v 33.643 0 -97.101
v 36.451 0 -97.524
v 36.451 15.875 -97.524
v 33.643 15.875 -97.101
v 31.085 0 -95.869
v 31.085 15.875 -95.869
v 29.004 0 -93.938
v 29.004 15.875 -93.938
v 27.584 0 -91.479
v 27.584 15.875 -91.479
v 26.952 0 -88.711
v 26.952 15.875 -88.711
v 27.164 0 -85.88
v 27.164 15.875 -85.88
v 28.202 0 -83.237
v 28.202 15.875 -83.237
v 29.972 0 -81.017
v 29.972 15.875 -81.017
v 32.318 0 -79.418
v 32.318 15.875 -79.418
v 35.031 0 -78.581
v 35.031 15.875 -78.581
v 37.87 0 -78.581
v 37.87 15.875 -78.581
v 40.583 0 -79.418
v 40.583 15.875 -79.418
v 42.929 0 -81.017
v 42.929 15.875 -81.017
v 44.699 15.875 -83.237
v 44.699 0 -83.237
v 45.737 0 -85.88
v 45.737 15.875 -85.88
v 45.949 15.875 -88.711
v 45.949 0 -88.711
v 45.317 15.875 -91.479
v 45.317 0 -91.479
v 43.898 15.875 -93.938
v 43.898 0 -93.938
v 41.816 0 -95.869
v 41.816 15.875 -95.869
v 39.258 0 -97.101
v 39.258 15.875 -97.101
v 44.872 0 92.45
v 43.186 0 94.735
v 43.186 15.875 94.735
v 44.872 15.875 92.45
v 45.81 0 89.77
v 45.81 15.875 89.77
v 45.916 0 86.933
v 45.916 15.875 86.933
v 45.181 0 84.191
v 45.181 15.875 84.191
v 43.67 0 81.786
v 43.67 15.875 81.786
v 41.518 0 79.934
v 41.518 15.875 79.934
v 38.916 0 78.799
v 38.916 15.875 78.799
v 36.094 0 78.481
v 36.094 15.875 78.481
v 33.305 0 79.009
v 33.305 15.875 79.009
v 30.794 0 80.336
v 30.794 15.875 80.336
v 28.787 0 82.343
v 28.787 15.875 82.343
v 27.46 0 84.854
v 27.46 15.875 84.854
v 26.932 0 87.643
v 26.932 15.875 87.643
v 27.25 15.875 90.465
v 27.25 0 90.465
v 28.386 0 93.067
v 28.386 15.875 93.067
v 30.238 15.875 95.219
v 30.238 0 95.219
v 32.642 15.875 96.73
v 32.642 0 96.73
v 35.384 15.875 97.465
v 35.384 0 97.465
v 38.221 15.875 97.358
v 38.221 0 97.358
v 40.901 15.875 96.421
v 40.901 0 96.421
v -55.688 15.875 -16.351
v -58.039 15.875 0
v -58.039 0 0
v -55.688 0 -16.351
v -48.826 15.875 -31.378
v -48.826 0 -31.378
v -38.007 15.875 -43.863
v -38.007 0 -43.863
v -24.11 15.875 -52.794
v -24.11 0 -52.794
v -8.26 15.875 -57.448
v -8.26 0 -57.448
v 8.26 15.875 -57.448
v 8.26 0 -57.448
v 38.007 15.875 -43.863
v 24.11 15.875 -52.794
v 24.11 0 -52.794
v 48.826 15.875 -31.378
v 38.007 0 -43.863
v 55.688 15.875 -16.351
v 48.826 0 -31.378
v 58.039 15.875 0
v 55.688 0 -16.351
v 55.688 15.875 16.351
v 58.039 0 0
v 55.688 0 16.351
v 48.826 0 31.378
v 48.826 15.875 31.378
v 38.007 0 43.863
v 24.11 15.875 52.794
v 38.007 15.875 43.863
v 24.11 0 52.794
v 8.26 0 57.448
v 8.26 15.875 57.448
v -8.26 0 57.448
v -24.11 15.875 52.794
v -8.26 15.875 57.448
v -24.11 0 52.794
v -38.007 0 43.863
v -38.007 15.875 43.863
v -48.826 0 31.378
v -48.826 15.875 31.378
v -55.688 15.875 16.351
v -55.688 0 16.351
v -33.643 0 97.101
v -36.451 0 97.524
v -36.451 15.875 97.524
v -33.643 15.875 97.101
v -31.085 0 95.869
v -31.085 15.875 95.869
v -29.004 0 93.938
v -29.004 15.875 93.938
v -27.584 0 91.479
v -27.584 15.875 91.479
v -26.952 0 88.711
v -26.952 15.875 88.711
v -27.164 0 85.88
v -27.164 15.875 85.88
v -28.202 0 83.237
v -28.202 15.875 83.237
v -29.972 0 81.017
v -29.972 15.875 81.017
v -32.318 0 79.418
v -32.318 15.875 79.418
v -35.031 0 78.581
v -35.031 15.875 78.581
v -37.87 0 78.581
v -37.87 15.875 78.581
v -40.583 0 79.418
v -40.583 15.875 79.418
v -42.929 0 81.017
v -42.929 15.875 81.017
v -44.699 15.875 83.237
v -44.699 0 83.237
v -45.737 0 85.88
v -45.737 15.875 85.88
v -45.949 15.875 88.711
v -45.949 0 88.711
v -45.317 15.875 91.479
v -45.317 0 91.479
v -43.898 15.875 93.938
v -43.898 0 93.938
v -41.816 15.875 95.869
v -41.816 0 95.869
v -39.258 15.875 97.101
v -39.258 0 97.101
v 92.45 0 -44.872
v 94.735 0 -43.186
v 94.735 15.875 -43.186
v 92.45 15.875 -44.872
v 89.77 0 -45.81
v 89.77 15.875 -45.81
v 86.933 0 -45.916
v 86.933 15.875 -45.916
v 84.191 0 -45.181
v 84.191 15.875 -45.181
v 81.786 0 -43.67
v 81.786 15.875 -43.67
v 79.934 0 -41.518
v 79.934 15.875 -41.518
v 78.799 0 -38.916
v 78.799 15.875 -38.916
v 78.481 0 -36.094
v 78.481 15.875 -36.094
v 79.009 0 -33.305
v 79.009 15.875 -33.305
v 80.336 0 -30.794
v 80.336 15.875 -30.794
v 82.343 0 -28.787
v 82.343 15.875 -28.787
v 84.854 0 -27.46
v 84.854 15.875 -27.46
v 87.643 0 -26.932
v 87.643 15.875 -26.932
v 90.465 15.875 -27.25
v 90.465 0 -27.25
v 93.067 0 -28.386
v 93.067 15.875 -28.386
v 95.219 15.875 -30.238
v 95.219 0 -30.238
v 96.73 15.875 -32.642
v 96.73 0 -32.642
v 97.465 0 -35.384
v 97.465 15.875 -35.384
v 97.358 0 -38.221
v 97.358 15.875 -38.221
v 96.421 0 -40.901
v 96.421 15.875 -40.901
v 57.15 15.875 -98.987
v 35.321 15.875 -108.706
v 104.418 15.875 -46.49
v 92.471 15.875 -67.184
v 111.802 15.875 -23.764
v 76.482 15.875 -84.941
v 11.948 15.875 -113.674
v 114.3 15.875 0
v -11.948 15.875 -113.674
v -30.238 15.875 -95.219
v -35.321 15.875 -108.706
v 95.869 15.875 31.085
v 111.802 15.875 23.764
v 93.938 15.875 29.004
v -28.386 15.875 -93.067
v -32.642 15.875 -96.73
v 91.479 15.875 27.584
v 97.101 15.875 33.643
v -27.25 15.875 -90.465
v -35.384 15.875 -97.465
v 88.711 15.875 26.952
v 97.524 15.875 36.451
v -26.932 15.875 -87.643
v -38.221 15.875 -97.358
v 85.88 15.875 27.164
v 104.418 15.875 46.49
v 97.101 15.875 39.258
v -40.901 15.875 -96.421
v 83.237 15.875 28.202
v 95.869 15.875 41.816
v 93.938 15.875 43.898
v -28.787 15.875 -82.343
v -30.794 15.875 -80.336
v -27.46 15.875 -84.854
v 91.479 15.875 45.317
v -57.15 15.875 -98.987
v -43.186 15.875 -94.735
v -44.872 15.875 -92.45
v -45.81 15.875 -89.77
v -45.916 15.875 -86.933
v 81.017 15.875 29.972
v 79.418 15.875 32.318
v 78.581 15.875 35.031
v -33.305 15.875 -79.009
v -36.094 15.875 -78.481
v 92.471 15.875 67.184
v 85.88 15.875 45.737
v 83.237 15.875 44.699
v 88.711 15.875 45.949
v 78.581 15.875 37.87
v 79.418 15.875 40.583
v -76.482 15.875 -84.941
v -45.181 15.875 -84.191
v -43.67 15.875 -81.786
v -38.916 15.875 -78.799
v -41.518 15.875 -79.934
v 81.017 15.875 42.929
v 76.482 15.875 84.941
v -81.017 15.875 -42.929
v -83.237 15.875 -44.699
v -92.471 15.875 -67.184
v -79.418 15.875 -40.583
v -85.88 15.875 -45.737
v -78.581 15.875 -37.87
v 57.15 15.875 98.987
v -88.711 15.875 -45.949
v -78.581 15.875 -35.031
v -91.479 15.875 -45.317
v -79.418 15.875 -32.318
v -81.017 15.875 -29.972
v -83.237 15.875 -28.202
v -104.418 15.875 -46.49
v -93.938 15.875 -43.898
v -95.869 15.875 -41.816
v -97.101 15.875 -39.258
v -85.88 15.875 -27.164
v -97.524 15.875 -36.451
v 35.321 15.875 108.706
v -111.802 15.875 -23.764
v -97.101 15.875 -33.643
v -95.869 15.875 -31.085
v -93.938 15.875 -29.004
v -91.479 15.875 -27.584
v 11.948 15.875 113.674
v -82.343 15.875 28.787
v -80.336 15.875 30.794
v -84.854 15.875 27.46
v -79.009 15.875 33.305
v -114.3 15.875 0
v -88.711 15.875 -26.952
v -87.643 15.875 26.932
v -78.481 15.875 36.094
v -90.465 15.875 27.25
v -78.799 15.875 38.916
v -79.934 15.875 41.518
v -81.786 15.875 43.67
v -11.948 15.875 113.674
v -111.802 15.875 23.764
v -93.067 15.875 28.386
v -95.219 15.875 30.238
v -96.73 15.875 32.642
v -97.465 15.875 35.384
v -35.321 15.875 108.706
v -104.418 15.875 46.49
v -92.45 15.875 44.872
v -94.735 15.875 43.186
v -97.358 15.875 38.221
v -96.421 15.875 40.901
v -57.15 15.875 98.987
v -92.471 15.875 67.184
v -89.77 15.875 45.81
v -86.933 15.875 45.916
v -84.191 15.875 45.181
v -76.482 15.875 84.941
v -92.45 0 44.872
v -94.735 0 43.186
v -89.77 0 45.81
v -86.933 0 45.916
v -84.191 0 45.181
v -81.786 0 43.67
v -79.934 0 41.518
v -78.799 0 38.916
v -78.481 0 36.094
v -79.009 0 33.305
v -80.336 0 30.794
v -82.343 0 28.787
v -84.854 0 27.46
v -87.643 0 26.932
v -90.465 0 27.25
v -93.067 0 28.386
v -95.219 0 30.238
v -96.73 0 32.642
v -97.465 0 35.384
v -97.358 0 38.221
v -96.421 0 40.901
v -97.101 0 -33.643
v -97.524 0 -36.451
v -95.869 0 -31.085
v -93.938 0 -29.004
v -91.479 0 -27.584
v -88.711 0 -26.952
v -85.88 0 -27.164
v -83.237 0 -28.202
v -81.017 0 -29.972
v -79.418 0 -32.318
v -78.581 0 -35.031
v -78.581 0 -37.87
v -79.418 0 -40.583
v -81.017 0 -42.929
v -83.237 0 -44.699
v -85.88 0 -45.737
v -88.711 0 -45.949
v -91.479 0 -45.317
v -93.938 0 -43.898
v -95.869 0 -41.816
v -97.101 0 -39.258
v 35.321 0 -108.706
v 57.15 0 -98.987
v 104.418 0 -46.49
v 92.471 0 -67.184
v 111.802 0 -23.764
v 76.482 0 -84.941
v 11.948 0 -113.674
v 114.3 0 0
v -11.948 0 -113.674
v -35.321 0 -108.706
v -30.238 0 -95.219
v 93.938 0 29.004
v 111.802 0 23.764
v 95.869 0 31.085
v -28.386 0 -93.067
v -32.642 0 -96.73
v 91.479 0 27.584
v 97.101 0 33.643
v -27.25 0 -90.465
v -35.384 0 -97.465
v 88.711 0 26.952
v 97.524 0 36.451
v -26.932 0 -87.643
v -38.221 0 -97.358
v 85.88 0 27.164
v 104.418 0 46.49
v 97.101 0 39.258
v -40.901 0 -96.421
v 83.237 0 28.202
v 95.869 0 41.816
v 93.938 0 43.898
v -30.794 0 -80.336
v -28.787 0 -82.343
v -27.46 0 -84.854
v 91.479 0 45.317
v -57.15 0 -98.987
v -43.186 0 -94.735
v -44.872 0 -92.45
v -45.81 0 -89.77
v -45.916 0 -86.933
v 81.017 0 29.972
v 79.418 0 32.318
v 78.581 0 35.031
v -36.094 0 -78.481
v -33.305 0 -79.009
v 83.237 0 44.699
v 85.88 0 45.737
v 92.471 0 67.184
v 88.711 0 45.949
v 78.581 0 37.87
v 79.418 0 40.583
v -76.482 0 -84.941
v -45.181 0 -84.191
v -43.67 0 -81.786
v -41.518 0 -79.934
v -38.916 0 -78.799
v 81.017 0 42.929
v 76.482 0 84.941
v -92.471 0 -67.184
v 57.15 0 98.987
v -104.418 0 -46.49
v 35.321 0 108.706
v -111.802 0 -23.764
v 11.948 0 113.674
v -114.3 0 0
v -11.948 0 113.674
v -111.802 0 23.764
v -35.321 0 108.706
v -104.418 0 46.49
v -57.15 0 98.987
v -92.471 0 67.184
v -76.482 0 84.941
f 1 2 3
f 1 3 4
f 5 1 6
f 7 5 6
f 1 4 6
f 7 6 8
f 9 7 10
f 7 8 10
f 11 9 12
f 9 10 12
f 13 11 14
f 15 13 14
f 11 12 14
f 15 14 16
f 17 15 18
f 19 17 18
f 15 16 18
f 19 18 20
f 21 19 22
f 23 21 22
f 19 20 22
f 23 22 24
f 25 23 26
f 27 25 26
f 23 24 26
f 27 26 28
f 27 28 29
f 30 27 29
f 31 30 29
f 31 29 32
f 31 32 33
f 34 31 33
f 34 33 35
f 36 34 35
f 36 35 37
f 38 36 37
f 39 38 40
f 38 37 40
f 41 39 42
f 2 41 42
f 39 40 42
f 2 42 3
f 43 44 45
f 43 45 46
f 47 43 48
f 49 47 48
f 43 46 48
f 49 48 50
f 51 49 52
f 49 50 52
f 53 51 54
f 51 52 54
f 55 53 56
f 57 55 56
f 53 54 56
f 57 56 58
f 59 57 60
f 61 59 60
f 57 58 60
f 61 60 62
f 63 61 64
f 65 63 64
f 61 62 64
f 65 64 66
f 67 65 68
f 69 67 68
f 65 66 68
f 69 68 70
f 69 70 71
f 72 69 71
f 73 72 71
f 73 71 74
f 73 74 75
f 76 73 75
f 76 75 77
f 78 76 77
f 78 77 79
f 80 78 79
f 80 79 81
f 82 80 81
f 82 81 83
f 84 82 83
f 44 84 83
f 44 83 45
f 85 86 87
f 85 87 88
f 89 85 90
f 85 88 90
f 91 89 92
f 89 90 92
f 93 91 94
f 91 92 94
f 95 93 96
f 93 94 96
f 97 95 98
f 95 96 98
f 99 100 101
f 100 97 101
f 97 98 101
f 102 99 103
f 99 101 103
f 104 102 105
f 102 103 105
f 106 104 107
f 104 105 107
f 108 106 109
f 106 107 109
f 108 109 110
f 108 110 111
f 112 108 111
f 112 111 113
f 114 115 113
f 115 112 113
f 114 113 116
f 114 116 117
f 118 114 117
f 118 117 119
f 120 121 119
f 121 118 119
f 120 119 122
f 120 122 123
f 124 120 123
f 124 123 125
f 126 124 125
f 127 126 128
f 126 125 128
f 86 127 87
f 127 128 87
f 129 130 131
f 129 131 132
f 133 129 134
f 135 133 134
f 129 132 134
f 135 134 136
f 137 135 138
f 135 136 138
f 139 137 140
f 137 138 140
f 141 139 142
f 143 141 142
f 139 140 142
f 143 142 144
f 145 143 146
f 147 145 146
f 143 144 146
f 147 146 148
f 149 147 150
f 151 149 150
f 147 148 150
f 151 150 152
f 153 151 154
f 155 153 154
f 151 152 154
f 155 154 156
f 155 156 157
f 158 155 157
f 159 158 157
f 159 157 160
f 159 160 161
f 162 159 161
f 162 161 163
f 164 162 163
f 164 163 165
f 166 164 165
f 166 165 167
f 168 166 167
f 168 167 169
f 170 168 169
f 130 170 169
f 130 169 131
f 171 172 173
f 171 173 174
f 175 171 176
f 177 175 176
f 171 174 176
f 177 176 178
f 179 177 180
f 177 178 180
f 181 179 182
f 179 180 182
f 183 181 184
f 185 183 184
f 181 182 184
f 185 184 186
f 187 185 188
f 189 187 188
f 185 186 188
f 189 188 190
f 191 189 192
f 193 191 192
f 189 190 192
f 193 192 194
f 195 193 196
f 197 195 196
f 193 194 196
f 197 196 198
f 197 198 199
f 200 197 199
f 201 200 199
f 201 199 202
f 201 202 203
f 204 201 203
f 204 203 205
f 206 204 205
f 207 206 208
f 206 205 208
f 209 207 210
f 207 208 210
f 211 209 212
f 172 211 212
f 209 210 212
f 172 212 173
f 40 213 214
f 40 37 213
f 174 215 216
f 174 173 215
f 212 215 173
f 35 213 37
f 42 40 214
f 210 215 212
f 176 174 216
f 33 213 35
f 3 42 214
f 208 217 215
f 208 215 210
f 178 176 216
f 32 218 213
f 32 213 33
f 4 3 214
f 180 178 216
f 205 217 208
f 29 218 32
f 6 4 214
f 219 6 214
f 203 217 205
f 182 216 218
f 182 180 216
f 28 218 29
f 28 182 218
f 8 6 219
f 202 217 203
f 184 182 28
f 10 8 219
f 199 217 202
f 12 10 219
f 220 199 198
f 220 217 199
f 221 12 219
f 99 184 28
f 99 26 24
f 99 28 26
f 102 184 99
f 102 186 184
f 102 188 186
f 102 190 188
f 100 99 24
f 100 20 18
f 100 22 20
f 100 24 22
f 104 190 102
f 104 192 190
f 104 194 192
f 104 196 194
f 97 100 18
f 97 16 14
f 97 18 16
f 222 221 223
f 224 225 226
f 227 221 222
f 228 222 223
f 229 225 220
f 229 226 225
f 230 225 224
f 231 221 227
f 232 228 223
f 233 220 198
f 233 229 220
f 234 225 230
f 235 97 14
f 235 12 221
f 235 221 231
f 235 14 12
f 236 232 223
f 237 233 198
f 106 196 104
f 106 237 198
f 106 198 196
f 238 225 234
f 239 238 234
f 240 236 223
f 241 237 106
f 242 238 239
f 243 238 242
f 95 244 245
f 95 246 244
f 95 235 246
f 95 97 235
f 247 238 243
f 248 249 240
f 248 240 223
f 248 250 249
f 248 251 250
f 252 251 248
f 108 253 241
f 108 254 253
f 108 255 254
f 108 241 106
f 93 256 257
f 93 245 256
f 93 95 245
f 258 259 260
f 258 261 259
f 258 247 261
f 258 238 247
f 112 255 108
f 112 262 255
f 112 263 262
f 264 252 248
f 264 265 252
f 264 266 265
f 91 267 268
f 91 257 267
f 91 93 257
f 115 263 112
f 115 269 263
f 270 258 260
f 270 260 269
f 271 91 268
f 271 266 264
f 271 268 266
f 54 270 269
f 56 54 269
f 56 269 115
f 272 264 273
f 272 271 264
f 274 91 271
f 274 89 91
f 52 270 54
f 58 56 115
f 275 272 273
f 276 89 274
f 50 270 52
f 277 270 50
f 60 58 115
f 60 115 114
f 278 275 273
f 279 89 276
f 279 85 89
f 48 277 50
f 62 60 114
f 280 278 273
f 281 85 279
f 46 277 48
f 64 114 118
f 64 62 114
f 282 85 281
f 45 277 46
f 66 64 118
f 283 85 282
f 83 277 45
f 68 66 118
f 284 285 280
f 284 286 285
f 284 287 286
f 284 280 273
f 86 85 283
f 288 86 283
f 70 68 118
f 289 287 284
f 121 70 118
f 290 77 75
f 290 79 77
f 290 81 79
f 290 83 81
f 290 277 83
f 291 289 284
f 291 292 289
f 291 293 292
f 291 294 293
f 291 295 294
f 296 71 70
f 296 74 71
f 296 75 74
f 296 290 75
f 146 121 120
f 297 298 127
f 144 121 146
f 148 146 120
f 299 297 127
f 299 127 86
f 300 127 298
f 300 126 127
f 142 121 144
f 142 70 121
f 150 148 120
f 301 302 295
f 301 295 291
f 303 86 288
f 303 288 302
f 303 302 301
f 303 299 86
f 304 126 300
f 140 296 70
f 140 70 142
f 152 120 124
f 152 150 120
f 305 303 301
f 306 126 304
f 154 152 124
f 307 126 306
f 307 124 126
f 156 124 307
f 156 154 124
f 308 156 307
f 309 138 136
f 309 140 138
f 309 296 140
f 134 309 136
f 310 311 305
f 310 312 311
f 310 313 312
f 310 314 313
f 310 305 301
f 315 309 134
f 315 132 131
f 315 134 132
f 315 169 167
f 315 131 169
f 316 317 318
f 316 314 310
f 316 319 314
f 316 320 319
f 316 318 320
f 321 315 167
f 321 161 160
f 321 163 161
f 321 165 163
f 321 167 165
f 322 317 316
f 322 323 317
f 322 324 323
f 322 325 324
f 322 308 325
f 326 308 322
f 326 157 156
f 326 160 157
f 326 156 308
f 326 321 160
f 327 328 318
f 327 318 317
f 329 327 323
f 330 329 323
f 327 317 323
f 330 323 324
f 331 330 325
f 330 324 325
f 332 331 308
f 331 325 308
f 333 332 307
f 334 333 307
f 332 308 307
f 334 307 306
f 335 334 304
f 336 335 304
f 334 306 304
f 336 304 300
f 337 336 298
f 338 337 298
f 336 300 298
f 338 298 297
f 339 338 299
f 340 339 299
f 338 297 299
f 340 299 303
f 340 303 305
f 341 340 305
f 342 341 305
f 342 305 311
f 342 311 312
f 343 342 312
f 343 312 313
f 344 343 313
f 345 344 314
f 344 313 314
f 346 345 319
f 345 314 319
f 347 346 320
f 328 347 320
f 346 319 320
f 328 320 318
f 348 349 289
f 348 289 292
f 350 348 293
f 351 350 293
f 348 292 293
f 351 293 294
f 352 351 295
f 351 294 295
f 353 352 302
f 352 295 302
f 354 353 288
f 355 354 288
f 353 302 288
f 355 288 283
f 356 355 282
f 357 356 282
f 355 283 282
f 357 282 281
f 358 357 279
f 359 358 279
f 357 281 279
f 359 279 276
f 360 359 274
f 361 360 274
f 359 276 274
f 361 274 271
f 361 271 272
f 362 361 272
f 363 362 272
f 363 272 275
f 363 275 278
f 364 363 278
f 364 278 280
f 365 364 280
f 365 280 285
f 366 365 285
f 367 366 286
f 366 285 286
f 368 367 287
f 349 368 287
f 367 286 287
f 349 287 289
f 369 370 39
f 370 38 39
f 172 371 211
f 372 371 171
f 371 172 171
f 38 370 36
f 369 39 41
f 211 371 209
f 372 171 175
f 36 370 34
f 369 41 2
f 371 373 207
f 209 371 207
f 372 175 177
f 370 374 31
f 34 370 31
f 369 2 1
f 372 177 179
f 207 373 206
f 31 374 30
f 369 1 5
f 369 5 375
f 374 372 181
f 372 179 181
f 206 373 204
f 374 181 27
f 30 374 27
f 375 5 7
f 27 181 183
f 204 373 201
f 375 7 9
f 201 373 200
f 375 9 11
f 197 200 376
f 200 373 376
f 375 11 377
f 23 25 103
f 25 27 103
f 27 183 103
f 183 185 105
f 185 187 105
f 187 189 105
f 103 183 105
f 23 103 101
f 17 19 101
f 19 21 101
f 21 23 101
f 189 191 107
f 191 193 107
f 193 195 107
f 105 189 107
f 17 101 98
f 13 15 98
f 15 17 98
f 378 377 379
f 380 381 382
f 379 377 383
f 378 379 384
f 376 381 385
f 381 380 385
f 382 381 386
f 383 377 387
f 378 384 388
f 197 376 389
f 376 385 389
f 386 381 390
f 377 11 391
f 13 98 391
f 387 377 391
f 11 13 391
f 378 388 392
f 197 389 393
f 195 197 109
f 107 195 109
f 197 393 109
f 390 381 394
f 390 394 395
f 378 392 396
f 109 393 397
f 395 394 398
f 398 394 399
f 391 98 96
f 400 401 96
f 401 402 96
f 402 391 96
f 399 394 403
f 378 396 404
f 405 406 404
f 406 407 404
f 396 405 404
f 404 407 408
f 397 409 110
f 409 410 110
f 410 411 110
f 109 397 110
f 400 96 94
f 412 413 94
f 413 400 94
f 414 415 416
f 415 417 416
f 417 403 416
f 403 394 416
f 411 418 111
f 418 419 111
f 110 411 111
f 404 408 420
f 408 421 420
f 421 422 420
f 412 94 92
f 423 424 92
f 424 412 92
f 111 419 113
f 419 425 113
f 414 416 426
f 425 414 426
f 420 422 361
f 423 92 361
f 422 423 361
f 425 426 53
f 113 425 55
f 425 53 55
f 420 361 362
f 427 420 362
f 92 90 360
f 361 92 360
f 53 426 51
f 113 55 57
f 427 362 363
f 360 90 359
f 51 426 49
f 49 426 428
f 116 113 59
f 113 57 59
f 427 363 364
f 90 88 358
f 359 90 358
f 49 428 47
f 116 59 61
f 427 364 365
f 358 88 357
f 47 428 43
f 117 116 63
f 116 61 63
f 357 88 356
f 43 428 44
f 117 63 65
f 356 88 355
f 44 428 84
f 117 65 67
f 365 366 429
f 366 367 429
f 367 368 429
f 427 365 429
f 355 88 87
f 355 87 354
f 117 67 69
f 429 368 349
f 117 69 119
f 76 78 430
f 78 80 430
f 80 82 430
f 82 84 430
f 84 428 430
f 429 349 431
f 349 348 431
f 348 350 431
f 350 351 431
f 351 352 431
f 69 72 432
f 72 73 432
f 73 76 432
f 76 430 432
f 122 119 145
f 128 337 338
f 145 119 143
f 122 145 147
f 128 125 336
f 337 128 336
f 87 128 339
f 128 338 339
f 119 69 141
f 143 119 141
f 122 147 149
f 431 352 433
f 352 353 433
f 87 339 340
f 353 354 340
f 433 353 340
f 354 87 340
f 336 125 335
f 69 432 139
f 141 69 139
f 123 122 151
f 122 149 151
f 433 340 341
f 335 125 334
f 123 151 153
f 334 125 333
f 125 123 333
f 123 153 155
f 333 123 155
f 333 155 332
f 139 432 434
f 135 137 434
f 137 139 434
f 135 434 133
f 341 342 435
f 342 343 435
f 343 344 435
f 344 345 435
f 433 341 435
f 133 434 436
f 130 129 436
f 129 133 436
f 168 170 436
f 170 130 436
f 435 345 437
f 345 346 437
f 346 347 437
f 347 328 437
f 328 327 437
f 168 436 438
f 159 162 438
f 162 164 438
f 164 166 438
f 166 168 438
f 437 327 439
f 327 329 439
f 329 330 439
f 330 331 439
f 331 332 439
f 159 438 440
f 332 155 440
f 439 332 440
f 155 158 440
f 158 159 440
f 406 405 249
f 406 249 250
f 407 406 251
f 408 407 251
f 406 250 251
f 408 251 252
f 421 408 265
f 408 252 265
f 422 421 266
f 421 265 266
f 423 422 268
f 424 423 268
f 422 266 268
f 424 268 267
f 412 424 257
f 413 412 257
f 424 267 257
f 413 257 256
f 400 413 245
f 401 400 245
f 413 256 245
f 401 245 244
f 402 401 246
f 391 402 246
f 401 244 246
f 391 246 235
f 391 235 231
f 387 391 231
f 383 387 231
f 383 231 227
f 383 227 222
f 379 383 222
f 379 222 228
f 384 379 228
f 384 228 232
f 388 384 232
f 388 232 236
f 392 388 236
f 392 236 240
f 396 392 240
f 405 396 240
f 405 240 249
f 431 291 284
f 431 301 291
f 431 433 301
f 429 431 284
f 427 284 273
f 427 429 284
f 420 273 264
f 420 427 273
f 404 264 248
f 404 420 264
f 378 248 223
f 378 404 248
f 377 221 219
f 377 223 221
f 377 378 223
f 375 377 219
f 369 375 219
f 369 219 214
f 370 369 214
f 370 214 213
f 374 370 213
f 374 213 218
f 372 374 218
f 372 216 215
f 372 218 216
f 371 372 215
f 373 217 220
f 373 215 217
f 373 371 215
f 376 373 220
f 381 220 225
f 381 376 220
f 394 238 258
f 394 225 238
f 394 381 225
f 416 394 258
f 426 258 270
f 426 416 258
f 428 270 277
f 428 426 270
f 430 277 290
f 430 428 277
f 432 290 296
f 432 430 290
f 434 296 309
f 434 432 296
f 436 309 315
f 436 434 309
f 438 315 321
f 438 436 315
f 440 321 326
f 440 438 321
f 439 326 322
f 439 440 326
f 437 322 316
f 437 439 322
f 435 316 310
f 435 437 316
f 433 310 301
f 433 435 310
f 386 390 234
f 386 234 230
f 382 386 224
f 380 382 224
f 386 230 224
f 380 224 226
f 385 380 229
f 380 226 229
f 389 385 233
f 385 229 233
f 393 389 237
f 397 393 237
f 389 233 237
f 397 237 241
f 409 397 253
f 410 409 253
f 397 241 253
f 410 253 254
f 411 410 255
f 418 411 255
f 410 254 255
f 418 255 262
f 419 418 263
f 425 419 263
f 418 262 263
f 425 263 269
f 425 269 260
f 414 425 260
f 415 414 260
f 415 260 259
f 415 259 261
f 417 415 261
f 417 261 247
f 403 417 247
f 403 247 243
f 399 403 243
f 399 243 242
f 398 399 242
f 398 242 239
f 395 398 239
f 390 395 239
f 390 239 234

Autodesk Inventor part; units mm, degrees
ref_plane "YZ Plane" through (0, 0, 0) normal (1, 0, 0) x (0, 1, 0)
ref_plane "XZ Plane" through (0, 0, 0) normal (0, 1, 0) x (-1, 0, 0)
ref_plane "XY Plane" through (0, 0, 0) normal (0, 0, 1) x (1, 0, 0)
sketch "Flange Sketch" plane through (0, 0, 0) normal (0, 1, 0) x (-1, 0, 0)
  circle A0 centre (0, 0) radius 114.3
  circle A1 centre (0, 0) radius 58.039
  circle A2 centre (0, 0) radius 95.25 construction
  line L0 (0, 0) -> (-36.4506, -87.9995) construction
  line L1 (0, 0) -> (0, -95.25) construction
  dimension "outerDiam" = 228.6
  dimension "innerDiam" = 116.078
  dimension "boltCircle" = 190.5
  dimension "boltOffsetAngle" = 22.5
extrude "Flange Extrusion" add sketch "Flange Sketch" along normal blind 15.875
hole "Bolt Hole" at (36.4506, 0, -87.9995) direction (0, 1, 0) diameter 19.05 depth 15.875
pattern_circular "Bolt Hole Pattern" count 8 over 360 about axis through (0, -10, 0) along (0, 1, 0) of "Bolt Hole"
equation "\"nominalSize\" = 101.6"
properties part number "AWWA-C207-B4-S"
